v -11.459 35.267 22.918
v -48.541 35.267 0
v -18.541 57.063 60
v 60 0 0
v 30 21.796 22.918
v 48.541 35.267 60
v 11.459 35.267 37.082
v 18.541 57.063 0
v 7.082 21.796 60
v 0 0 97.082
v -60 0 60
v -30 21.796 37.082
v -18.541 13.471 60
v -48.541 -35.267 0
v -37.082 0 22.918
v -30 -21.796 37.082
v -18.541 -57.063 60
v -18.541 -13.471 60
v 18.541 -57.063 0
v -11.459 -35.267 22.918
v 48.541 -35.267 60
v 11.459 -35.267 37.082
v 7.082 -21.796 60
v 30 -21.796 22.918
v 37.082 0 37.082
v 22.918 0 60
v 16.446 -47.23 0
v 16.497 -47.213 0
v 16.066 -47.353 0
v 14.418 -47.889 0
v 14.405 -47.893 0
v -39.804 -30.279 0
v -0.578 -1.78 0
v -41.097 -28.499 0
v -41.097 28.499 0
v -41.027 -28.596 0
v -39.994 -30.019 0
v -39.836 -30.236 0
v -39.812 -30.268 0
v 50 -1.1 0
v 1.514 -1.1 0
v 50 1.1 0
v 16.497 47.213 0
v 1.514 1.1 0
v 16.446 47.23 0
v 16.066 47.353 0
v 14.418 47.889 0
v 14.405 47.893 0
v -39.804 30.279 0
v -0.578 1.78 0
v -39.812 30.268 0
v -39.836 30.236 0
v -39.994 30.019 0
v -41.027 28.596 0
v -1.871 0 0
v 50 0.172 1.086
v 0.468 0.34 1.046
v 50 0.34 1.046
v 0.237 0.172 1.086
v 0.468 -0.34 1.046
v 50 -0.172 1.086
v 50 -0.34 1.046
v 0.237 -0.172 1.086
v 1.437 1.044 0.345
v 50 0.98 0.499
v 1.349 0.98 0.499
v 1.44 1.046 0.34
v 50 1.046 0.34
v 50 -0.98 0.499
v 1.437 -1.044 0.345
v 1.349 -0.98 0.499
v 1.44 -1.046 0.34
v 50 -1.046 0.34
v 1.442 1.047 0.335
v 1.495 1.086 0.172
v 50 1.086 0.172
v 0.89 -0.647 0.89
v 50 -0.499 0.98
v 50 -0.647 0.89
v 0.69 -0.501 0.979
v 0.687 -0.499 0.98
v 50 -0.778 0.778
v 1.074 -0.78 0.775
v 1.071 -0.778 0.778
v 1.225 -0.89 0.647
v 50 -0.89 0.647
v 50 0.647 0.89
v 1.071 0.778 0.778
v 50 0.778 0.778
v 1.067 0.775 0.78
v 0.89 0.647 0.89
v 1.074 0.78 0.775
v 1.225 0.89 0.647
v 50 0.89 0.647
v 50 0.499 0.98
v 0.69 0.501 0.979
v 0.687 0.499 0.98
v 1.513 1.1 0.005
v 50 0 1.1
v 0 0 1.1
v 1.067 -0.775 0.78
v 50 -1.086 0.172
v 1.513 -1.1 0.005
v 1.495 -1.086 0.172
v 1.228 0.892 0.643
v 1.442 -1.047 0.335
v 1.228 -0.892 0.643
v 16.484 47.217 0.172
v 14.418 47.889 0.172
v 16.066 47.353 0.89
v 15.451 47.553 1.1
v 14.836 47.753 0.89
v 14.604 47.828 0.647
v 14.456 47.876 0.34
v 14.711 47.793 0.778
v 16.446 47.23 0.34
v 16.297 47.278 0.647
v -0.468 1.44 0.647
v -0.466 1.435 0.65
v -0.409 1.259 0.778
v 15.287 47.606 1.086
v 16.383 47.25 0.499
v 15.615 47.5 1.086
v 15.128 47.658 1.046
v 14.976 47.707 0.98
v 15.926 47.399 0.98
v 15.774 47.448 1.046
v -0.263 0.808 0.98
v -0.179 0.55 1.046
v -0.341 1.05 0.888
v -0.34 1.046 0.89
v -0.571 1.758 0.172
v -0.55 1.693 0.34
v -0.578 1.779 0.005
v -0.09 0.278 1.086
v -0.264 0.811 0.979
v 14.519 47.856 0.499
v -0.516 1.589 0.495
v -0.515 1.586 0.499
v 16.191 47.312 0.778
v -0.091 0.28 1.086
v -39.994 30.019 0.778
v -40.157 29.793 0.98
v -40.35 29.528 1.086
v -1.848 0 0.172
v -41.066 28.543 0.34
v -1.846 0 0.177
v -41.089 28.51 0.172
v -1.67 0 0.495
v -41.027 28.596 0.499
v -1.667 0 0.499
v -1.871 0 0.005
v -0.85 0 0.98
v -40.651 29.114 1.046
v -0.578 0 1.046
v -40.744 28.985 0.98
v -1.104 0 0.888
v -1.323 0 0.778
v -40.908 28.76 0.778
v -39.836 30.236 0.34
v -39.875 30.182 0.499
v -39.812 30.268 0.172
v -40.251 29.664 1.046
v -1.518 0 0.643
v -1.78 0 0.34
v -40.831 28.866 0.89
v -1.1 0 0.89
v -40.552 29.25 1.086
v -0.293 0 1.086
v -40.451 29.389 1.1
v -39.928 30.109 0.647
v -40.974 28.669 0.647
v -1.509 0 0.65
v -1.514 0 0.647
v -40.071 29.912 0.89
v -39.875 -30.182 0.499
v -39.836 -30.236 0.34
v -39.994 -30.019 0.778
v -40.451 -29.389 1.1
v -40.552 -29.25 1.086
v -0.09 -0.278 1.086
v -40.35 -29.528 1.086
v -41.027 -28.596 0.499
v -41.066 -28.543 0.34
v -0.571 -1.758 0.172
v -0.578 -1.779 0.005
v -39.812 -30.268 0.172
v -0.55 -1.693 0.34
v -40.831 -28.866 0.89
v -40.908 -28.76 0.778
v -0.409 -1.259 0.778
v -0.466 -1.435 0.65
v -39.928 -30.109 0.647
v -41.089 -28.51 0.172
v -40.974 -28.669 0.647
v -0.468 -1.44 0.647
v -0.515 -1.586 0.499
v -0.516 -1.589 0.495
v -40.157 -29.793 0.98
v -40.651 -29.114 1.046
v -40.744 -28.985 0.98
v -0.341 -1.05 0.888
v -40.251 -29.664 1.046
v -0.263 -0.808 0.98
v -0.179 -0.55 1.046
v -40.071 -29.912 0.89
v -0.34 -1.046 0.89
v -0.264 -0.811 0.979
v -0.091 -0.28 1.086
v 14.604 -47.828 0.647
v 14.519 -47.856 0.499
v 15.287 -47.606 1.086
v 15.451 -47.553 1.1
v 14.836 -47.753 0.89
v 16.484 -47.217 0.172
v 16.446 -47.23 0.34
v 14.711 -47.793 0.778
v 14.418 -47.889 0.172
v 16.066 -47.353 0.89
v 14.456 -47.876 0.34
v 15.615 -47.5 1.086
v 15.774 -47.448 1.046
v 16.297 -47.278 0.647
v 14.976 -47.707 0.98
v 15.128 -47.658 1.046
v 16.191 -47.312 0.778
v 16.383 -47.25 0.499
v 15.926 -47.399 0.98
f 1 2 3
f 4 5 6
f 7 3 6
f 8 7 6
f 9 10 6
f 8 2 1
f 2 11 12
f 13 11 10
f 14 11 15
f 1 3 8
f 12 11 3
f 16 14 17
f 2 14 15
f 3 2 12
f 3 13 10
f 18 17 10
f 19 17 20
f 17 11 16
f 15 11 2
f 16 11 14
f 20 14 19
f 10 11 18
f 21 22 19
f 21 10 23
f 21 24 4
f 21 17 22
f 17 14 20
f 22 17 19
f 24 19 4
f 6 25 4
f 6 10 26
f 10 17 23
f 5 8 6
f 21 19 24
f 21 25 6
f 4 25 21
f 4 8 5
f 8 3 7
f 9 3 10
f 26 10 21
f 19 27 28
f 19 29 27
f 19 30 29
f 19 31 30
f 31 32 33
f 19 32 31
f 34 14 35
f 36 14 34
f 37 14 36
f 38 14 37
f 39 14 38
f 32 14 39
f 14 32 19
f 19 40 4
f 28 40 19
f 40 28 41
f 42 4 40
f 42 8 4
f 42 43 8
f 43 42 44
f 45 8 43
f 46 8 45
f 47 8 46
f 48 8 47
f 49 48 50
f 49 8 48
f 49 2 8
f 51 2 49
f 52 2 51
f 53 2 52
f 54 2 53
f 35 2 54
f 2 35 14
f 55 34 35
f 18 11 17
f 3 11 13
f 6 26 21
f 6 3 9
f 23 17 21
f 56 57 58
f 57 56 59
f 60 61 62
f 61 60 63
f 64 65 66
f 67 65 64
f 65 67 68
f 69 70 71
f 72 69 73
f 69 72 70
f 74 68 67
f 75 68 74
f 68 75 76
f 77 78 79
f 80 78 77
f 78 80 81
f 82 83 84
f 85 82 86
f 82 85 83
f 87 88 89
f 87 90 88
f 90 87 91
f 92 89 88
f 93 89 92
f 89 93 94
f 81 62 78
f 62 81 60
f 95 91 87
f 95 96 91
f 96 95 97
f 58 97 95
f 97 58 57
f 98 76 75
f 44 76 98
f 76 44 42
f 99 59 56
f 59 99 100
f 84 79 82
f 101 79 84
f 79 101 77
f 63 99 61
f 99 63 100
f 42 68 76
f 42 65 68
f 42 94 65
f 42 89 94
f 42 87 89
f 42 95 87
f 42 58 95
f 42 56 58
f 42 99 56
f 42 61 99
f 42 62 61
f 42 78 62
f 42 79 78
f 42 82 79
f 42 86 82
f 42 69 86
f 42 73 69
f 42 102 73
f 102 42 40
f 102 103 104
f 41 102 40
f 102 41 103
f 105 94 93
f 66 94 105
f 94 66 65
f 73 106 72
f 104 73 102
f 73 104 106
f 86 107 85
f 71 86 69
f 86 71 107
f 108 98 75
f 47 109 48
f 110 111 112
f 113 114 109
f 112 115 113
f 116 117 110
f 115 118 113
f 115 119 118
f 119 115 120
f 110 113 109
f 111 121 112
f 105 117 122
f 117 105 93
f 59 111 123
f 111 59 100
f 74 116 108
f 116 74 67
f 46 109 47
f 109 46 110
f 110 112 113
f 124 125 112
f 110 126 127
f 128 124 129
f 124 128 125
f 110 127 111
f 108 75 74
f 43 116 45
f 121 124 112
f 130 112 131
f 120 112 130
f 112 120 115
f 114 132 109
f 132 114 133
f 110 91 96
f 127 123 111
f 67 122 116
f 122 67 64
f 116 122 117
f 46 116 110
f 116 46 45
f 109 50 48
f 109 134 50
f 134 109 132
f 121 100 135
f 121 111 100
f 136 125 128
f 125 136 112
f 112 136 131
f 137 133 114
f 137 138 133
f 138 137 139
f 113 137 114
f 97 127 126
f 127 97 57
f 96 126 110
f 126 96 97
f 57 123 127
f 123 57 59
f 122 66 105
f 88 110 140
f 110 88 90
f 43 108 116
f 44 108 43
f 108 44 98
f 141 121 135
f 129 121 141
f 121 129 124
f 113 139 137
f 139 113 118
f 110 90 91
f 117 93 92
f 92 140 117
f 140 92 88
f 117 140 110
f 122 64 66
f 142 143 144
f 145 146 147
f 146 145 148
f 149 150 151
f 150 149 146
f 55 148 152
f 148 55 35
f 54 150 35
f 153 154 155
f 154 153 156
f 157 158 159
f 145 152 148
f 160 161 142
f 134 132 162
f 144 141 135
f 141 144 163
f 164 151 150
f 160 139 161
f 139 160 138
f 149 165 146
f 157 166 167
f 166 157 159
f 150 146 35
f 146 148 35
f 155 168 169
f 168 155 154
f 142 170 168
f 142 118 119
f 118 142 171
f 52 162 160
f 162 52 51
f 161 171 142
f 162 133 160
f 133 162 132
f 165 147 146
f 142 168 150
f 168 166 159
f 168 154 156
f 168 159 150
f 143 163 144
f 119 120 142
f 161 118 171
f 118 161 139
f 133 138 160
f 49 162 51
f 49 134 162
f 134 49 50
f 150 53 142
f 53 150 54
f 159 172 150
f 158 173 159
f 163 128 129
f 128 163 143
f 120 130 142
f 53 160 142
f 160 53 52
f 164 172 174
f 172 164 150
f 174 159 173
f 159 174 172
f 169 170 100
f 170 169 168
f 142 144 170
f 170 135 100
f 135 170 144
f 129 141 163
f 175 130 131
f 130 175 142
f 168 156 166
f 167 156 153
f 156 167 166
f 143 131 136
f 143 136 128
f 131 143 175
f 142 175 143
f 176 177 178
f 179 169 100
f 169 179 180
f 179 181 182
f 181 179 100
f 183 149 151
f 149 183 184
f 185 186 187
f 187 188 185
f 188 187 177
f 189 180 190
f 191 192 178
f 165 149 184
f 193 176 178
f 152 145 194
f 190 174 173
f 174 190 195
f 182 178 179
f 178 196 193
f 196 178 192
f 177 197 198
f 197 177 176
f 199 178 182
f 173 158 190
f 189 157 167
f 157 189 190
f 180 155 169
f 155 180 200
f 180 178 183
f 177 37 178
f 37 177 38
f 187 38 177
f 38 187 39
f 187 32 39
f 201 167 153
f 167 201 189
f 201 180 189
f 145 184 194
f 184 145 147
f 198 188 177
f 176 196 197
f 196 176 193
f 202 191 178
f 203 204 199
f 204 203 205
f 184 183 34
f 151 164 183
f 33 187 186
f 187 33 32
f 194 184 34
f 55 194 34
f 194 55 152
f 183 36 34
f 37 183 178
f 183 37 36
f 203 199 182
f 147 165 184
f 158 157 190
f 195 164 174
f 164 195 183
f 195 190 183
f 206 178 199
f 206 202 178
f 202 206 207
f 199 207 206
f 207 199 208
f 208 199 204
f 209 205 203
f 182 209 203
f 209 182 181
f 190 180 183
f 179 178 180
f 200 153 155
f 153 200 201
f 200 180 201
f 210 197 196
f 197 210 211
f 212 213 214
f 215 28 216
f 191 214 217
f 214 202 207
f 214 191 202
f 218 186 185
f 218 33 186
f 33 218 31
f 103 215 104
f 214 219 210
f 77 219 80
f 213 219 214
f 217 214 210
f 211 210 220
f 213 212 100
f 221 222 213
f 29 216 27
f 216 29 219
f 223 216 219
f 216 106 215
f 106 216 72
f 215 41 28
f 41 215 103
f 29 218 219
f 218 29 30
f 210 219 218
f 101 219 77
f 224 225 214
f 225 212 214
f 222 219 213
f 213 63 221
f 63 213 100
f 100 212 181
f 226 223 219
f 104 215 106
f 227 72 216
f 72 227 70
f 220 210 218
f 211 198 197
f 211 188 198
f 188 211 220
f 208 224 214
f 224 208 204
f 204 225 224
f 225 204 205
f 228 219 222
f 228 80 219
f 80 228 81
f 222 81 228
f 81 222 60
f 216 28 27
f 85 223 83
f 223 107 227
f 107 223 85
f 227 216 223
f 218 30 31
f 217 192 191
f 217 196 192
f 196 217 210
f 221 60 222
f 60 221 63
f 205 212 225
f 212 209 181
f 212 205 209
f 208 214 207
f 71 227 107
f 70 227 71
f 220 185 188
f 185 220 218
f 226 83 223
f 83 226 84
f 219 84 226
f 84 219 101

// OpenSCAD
// Radial distance of 10 of the 12 icosohedral vertexes from the axis through
// the other two.  I.e., standing on point, it fits in a vertical tube with
// this radius.
radius = 60;

// Side of pentagon through 5 vertexes.
side = 2 * radius * sin(36);

// Height from a vertex to nearest ring of five.
z1 = sqrt(side * side - radius * radius);

// Calculate height between two parallel pentagons.
dx = radius * (1 - cos(36));
dy = radius * sin(36);
z22 = sqrt(side * side - dx * dx - dy * dy);

// Height from pentagon to center.
z2 = z22 / 2;

// Height from vertex to center.
z12 = z1 + z2;

p1 = [0, 0, -z12];
function r1(i) = [radius * cos(72 * i), radius * sin(72 * i), -z2];
function r2(i) = [radius * cos(72 * i + 36), radius * sin(72 * i + 36), z2];
p2 = [0, 0, z12];

module face(a,b,c,d,e) {
    p = -0.02 * (a + b + c + d + e);
    polyhedron(
        points = [p, a, b, c, d, e],
        faces = [
            [1, 2, 3, 4, 5],
            [2, 1, 0],
            [3, 2, 0],
            [4, 3, 0],
            [5, 4, 0],
            [1, 5, 0]]);
}

module great_dodec() {
    face(r1(0), r1(1), r1(2), r1(3), r1(4));
    for (i = [0:4]) {
        face(p1, r1(i), r2(i), r2(i+1), r1(i+2));
        face(p2, r2(i+2), r1(i+2), r1(i+1), r2(i));
    }
    face(r2(4), r2(3), r2(2), r2(1), r2(0));
}

// "star" is attached to "main". To guide it into position, we place a
// joiner between them.  The joiner is just five separate pieces of 1.75mm
// filament.  We leave an indentation of diameter 2mm to place the joiner
// segments into.
// "joiner" returns the shape which is removed from the two pieces.
module joiner() {
        for (i = [0:4])
            rotate(72 * i)
                rotate([0,90,0]) cylinder(r=1.1, h=(radius - 10), $fn=40);
}

module main() {
    difference() {
        intersection() {
            translate([0,0,z2]) great_dodec();
            translate([0,0,100]) cube(200, center=true);
        }
        joiner();
    }
}

module star() {
    difference() {
        intersection() {
            translate([0,0,-z2-1e-5]) great_dodec();
            translate([0,0,100]) cube(200, center=true);
        }
        rotate(180) joiner();
    }
}

module stand() {
    // The pentagon that fits in the middle of a pentagram has radius 1/ϕ²
    // times the circumscribed pentagram.
    $fn = 40;
    phi = (1 + sqrt(5)) / 2;
    for (i = [0:4]) {
        rotate(i * 72) {
            difference() {
                translate([-radius/phi/phi - 2, 0, 0]) {
                    cylinder(r=3, h=z1+1);
                    translate([0, 0, z1+1]) cylinder(r1=3, r2=1, h=2);
                }
                translate([-0.5, 0, (z1+z2)+2]) great_dodec();
            }
        }
    }
    minkowski() {
        difference() {
            cylinder(h=0.1, r=radius/phi/phi + 5, $fn=120);
            cylinder(h=0.1, r=5, $fn=40);
        }
        intersection() {
            sphere(r=1.9);
            cylinder(r=1.9, h=2);
        }
    }
}

main();
